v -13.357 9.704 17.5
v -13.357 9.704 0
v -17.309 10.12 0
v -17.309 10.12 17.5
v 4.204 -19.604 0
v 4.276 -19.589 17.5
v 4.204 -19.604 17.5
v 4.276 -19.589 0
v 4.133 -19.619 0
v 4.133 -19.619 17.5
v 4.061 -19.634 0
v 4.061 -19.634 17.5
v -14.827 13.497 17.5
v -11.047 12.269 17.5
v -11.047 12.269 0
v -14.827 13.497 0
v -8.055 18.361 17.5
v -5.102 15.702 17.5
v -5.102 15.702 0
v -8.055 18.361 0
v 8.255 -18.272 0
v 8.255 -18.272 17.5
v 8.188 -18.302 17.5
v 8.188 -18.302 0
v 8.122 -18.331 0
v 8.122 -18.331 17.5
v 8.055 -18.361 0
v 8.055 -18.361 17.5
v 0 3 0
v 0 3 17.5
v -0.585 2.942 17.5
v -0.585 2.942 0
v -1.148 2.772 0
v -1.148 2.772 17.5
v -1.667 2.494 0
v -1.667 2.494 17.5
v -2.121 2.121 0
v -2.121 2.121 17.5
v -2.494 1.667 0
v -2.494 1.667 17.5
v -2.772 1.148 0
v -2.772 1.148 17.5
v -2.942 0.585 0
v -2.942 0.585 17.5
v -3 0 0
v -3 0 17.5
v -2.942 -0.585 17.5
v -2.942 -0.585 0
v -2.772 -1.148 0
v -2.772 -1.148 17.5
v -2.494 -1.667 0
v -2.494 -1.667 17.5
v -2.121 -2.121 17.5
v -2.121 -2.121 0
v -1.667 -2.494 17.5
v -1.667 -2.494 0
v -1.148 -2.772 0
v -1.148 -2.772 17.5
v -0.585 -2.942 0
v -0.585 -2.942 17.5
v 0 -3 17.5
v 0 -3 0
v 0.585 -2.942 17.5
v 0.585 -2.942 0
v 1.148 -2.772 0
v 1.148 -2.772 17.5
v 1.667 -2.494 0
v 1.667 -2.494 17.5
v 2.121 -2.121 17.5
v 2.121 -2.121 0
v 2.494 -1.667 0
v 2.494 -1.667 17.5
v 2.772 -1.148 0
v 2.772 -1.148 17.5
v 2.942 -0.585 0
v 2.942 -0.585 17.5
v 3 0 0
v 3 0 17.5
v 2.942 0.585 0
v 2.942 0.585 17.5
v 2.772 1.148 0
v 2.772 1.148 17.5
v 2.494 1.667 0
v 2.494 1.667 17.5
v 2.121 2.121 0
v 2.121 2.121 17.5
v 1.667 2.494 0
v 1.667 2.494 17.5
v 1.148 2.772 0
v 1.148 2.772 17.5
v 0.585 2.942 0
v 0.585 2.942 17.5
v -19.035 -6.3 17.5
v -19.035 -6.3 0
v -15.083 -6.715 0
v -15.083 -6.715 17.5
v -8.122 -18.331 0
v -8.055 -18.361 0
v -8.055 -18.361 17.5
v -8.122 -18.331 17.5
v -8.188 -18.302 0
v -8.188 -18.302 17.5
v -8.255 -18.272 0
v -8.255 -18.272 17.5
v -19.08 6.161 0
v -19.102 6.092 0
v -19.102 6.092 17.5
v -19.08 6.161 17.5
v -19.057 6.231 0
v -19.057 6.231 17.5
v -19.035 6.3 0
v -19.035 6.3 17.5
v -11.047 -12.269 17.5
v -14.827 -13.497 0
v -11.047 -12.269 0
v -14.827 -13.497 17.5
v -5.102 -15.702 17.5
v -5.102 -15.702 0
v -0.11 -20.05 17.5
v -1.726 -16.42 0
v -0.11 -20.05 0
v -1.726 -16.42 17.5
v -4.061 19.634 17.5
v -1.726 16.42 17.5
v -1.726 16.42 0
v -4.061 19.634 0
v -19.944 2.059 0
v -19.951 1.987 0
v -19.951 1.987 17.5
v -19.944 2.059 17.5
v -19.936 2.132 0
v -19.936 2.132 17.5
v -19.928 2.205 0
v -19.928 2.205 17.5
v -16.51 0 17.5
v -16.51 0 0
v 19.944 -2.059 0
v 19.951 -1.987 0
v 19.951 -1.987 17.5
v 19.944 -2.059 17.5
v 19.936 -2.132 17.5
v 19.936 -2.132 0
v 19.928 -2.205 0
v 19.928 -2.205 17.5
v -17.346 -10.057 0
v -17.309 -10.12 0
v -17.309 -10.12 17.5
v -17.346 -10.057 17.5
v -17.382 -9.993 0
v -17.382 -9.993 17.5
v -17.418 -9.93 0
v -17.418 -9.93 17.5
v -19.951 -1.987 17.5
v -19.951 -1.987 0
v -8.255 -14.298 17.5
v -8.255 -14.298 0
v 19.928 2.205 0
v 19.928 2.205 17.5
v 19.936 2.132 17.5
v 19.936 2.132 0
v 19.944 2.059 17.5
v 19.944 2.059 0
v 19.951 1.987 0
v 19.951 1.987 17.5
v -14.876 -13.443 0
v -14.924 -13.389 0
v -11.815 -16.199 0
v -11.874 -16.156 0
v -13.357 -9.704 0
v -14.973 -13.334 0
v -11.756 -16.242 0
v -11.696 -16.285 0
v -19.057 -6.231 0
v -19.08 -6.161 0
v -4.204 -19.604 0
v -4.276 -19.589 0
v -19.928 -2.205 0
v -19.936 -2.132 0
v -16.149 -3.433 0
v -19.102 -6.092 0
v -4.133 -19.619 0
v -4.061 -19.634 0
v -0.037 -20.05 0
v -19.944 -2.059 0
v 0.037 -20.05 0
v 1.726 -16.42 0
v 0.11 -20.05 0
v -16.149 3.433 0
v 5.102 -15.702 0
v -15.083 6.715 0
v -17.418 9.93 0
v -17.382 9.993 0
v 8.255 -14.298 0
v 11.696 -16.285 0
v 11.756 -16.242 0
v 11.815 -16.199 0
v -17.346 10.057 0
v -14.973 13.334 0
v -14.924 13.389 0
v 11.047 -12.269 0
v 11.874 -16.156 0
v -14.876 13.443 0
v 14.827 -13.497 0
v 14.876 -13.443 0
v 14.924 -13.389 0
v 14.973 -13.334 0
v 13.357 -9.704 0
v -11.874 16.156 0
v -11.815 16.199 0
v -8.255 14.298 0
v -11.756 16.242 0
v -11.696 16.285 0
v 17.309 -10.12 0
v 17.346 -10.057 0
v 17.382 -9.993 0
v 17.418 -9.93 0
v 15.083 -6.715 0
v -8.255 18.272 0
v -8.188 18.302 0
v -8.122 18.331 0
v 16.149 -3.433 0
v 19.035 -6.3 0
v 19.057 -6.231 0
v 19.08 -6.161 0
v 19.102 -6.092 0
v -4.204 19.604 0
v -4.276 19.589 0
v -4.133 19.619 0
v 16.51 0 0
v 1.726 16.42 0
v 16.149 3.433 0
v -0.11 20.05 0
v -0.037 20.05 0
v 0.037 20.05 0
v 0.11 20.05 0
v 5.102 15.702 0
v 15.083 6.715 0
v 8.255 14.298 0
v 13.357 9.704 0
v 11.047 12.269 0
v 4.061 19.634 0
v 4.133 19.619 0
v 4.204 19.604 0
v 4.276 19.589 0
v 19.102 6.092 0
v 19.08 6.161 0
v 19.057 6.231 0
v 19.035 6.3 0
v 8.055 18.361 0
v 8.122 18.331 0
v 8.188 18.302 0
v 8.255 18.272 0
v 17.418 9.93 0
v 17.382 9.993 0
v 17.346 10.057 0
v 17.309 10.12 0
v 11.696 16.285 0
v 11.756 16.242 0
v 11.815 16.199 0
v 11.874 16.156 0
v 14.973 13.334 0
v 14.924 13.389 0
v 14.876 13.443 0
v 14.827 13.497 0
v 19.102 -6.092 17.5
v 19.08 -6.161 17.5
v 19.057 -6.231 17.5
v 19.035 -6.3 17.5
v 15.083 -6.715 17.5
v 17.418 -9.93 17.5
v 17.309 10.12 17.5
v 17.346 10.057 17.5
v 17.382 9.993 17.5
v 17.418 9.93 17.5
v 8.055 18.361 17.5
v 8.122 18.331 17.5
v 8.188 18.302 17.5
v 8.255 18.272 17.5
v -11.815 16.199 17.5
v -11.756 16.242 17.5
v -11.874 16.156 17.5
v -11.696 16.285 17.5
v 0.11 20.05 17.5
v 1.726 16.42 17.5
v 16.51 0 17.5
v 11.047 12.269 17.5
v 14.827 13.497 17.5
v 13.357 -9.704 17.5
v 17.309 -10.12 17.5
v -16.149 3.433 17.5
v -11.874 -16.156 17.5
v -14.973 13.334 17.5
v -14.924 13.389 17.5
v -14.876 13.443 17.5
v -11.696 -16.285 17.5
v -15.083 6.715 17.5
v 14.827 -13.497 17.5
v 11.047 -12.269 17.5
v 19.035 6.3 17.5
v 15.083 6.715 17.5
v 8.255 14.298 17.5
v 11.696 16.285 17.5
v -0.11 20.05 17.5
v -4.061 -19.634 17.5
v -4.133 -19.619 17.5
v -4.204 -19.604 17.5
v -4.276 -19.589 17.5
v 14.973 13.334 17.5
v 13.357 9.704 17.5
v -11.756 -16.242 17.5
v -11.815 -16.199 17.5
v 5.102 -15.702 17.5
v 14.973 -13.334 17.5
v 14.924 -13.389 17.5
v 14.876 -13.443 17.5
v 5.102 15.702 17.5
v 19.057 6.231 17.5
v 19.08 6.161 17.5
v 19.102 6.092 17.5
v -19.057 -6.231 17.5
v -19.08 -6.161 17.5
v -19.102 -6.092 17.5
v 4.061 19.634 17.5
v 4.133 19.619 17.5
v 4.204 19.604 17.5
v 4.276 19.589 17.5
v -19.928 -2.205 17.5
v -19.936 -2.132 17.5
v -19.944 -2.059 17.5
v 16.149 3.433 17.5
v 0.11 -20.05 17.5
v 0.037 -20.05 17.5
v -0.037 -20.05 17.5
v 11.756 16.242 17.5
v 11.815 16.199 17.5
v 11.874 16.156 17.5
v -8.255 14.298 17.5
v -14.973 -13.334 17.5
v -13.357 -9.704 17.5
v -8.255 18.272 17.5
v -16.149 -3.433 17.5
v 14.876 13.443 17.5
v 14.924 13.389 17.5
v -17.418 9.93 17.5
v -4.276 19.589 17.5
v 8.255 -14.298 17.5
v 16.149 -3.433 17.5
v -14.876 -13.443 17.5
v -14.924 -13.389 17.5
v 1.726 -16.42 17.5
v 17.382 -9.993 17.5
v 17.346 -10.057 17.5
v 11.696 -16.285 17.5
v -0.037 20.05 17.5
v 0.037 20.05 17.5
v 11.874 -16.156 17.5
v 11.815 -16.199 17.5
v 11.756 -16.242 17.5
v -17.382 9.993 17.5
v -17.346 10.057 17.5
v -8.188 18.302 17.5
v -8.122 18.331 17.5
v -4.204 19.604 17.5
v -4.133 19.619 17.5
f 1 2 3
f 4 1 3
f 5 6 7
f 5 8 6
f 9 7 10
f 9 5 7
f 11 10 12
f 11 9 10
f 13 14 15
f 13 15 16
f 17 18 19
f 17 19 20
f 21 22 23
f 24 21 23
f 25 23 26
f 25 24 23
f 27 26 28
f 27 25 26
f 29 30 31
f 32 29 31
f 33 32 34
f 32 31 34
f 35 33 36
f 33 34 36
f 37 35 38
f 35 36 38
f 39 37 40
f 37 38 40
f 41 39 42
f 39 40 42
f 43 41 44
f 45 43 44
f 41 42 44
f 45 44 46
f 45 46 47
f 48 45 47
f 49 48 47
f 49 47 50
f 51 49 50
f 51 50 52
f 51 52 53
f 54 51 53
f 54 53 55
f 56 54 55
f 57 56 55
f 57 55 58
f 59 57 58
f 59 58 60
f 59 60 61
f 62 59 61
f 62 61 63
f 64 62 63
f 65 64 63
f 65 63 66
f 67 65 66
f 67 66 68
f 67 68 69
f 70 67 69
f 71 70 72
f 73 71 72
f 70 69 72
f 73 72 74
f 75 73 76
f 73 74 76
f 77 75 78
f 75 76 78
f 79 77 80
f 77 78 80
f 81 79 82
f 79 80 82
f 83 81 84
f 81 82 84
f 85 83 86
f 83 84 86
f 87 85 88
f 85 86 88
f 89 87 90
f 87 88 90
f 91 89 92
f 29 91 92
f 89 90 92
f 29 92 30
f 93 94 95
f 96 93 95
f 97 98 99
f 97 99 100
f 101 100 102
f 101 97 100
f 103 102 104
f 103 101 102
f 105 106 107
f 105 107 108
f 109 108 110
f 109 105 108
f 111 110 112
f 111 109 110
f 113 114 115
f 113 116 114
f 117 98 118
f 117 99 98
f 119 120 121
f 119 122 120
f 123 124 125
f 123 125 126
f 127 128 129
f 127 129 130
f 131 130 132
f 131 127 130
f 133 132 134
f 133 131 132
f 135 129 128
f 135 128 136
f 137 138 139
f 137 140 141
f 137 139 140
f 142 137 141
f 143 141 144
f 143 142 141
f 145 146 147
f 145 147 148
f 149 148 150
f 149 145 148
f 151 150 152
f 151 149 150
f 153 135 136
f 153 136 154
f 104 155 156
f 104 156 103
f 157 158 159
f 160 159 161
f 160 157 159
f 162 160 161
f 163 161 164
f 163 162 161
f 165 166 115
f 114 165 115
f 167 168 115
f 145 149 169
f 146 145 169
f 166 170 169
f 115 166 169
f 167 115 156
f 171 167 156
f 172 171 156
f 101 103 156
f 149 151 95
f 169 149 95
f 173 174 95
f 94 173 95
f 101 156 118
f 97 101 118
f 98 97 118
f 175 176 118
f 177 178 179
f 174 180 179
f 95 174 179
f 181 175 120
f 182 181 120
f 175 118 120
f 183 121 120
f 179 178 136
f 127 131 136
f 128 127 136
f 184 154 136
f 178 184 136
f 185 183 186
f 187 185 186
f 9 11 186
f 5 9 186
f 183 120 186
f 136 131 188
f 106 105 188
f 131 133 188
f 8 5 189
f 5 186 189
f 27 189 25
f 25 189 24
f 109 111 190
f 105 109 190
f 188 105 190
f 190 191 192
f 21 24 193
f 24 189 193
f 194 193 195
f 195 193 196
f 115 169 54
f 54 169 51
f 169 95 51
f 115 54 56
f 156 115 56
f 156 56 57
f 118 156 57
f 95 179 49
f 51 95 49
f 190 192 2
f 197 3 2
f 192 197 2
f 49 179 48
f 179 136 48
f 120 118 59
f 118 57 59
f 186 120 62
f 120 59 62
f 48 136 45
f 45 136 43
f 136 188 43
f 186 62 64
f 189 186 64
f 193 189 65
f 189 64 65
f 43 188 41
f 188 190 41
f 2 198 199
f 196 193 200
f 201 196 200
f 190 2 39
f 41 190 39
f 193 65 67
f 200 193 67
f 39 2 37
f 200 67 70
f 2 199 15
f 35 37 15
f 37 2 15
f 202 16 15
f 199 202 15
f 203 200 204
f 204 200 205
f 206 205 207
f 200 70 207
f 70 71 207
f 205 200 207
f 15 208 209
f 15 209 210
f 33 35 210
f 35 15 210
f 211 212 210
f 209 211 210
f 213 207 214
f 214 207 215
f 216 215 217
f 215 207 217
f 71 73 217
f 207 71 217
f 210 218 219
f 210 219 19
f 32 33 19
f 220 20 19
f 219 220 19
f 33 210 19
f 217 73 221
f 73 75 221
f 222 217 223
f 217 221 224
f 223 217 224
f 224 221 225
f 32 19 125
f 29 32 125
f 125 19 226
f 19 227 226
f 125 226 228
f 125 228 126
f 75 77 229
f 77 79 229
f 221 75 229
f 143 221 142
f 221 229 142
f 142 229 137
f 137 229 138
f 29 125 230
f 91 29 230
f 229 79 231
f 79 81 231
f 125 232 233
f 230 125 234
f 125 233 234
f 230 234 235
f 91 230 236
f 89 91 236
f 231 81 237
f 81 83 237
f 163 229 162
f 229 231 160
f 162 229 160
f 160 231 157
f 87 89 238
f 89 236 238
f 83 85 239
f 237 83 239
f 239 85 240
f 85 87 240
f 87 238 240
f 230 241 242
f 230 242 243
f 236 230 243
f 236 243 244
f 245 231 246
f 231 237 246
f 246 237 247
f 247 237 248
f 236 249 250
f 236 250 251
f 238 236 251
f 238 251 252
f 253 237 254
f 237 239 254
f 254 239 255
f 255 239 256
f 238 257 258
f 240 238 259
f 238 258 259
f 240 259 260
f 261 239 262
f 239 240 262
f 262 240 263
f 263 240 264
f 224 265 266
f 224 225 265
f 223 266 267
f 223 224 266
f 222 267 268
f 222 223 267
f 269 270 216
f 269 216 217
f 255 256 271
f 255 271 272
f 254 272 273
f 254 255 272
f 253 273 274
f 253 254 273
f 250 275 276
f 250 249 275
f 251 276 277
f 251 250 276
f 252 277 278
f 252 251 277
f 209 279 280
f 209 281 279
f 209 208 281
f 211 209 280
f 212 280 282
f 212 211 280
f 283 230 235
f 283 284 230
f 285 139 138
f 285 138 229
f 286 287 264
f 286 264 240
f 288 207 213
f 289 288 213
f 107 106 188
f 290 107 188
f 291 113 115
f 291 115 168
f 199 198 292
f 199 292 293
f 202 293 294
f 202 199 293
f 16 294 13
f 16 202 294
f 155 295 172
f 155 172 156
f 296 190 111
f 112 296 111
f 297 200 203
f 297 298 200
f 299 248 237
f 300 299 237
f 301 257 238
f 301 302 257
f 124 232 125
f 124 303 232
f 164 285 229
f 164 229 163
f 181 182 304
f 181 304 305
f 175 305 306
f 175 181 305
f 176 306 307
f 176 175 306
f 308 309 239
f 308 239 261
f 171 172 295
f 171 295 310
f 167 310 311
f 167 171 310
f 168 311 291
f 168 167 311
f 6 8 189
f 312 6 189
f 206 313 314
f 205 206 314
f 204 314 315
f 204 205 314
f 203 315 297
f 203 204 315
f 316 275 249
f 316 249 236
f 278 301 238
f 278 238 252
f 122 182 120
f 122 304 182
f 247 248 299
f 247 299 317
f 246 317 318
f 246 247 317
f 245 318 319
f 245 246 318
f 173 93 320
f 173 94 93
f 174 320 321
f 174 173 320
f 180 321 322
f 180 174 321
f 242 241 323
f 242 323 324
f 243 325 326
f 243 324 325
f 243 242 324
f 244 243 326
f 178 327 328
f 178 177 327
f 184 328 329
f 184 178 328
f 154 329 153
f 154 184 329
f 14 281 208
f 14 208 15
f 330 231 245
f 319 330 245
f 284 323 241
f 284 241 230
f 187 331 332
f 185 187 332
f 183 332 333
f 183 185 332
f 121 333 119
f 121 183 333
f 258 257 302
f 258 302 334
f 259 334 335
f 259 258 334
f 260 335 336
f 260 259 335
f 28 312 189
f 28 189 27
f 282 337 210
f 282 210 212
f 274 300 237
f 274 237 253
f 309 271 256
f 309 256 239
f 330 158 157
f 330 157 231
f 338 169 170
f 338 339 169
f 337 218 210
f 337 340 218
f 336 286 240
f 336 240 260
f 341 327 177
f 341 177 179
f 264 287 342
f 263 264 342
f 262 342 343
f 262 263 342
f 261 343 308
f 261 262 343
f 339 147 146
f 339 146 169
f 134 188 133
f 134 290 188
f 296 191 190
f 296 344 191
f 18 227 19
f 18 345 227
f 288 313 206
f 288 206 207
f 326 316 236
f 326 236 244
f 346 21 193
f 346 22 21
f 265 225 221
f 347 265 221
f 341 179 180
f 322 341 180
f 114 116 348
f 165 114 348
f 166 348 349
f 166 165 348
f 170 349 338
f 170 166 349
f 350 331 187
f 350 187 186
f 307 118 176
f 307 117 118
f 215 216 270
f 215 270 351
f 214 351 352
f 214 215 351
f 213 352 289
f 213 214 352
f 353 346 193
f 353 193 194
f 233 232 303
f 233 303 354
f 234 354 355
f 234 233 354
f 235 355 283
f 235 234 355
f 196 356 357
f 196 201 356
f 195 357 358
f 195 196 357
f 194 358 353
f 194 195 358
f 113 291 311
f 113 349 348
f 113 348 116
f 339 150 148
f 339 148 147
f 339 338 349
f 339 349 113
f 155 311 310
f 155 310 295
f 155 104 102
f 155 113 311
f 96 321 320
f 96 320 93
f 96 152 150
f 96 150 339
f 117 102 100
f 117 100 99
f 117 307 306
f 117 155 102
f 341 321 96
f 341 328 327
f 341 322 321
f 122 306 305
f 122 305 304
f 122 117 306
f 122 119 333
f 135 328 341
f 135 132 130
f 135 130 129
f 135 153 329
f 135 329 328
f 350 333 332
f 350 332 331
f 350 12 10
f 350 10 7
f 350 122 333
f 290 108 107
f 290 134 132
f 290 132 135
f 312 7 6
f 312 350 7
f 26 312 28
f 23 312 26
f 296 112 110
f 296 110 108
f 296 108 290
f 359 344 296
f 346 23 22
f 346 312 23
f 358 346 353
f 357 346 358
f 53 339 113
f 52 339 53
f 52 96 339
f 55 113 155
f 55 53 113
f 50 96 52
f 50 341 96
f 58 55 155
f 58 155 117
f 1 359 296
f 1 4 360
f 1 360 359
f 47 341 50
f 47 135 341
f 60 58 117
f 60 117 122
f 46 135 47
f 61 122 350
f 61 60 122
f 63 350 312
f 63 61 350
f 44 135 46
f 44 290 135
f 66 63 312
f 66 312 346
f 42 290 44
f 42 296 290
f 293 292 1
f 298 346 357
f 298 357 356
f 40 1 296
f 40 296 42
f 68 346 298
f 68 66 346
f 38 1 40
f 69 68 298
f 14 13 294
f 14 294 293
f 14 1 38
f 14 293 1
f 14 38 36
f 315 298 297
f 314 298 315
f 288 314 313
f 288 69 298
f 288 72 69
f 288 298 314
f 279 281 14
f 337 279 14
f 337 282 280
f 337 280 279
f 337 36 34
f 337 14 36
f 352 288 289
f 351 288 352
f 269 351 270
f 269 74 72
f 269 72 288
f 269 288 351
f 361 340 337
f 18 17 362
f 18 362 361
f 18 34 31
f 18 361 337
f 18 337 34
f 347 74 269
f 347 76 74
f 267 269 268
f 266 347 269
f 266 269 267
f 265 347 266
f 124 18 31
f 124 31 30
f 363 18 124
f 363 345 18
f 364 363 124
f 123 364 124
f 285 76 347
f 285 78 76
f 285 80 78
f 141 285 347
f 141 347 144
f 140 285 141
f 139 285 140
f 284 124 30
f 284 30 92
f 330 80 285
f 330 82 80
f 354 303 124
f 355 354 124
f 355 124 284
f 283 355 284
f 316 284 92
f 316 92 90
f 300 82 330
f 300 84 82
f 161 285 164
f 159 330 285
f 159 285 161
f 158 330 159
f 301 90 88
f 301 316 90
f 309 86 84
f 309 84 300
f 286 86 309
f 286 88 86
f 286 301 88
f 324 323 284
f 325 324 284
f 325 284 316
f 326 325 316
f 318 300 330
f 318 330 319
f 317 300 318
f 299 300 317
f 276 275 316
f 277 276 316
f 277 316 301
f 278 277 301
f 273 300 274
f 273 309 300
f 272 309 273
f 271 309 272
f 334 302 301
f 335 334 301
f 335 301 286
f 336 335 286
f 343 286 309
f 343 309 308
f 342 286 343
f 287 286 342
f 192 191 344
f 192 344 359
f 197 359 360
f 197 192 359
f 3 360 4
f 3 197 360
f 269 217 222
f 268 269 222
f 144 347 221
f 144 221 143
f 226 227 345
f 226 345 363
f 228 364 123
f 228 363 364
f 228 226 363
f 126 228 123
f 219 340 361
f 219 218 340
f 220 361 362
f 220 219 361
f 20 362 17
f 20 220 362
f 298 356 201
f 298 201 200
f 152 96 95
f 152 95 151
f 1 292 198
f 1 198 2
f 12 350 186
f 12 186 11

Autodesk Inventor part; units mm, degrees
ref_plane "YZ Plane" through (0, 0, 0) normal (1, 0, 0) x (0, 1, 0)
ref_plane "XZ Plane" through (0, 0, 0) normal (0, 1, 0) x (-1, 0, 0)
ref_plane "XY Plane" through (0, 0, 0) normal (0, 0, 1) x (1, 0, 0)
sketch "Sketch1" plane through (0, 0, 0) normal (0, 0, 1) x (1, 0, 0)
  circle A0 centre (0, 0) radius 20.05
  dimension "d0" = 40.1
extrude "Extrusion1" add sketch "Sketch1" along normal blind 17.5
sketch "Sketch2" plane through (0, 0, 17.5) normal (0, 0, 1) x (1, 0, 0)
  line L0 (-16.51, 0) -> (-20.1782, -2.1178)
  line L1 (-20.1782, -2.1178) -> (-20.1782, 2.1178)
  line L2 (-20.1782, 2.1178) -> (-16.51, 0)
  line L3 (-16.1492, -3.4326) -> (-19.297, -6.2669)
  line L4 (-19.297, -6.2669) -> (-20.1776, -2.1237)
  line L5 (-20.1776, -2.1237) -> (-16.1492, -3.4326)
  line L6 (-15.0827, -6.7152) -> (-17.5723, -10.142)
  line L7 (-17.5723, -10.142) -> (-19.2951, -6.2725)
  line L8 (-19.2951, -6.2725) -> (-15.0827, -6.7152)
  line L9 (-13.3569, -9.7043) -> (-15.0797, -13.5738)
  line L10 (-15.0797, -13.5738) -> (-17.5694, -10.1471)
  line L11 (-17.5694, -10.1471) -> (-13.3569, -9.7043)
  line L12 (-11.0474, -12.2693) -> (-11.928, -16.4125)
  line L13 (-11.928, -16.4125) -> (-15.0757, -13.5782)
  line L14 (-15.0757, -13.5782) -> (-11.0474, -12.2693)
  line L15 (-8.255, -14.2981) -> (-8.255, -18.5338)
  line L16 (-8.255, -18.5338) -> (-11.9232, -16.4159)
  line L17 (-11.9232, -16.4159) -> (-8.255, -14.2981)
  line L18 (-5.1019, -15.702) -> (-4.2212, -19.8451)
  line L19 (-4.2212, -19.8451) -> (-8.2496, -18.5362)
  line L20 (-8.2496, -18.5362) -> (-5.1019, -15.702)
  line L21 (-1.7258, -16.4196) -> (-0.003, -20.2891)
  line L22 (-0.003, -20.2891) -> (-4.2154, -19.8463)
  line L23 (-4.2154, -19.8463) -> (-1.7258, -16.4196)
  line L24 (1.7258, -16.4196) -> (4.2154, -19.8463)
  line L25 (4.2154, -19.8463) -> (0.003, -20.2891)
  line L26 (0.003, -20.2891) -> (1.7258, -16.4196)
  line L27 (5.1019, -15.702) -> (8.2496, -18.5362)
  line L28 (8.2496, -18.5362) -> (4.2212, -19.8451)
  line L29 (4.2212, -19.8451) -> (5.1019, -15.702)
  line L30 (8.255, -14.2981) -> (11.9232, -16.4159)
  line L31 (11.9232, -16.4159) -> (8.255, -18.5338)
  line L32 (8.255, -18.5338) -> (8.255, -14.2981)
  line L33 (11.0474, -12.2693) -> (15.0757, -13.5782)
  line L34 (15.0757, -13.5782) -> (11.928, -16.4125)
  line L35 (11.928, -16.4125) -> (11.0474, -12.2693)
  line L36 (13.3569, -9.7043) -> (17.5694, -10.1471)
  line L37 (17.5694, -10.1471) -> (15.0797, -13.5738)
  line L38 (15.0797, -13.5738) -> (13.3569, -9.7043)
  line L39 (15.0827, -6.7152) -> (19.2951, -6.2725)
  line L40 (19.2951, -6.2725) -> (17.5723, -10.142)
  line L41 (17.5723, -10.142) -> (15.0827, -6.7152)
  line L42 (16.1492, -3.4326) -> (20.1776, -2.1237)
  line L43 (20.1776, -2.1237) -> (19.297, -6.2669)
  line L44 (19.297, -6.2669) -> (16.1492, -3.4326)
  line L45 (16.51, 0) -> (20.1782, 2.1178)
  line L46 (20.1782, 2.1178) -> (20.1782, -2.1178)
  line L47 (20.1782, -2.1178) -> (16.51, 0)
  line L48 (16.1492, 3.4326) -> (19.297, 6.2669)
  line L49 (19.297, 6.2669) -> (20.1776, 2.1237)
  line L50 (20.1776, 2.1237) -> (16.1492, 3.4326)
  line L51 (15.0827, 6.7152) -> (17.5723, 10.142)
  line L52 (17.5723, 10.142) -> (19.2951, 6.2725)
  line L53 (19.2951, 6.2725) -> (15.0827, 6.7152)
  line L54 (13.3569, 9.7043) -> (15.0797, 13.5738)
  line L55 (15.0797, 13.5738) -> (17.5694, 10.1471)
  line L56 (17.5694, 10.1471) -> (13.3569, 9.7043)
  line L57 (11.0474, 12.2693) -> (11.928, 16.4125)
  line L58 (11.928, 16.4125) -> (15.0757, 13.5782)
  line L59 (15.0757, 13.5782) -> (11.0474, 12.2693)
  line L60 (8.255, 14.2981) -> (8.255, 18.5338)
  line L61 (8.255, 18.5338) -> (11.9232, 16.4159)
  line L62 (11.9232, 16.4159) -> (8.255, 14.2981)
  line L63 (5.1019, 15.702) -> (4.2212, 19.8451)
  line L64 (4.2212, 19.8451) -> (8.2496, 18.5362)
  line L65 (8.2496, 18.5362) -> (5.1019, 15.702)
  line L66 (1.7258, 16.4196) -> (0.003, 20.2891)
  line L67 (0.003, 20.2891) -> (4.2154, 19.8463)
  line L68 (4.2154, 19.8463) -> (1.7258, 16.4196)
  line L69 (-1.7258, 16.4196) -> (-4.2154, 19.8463)
  line L70 (-4.2154, 19.8463) -> (-0.003, 20.2891)
  line L71 (-0.003, 20.2891) -> (-1.7258, 16.4196)
  line L72 (-5.1019, 15.702) -> (-8.2496, 18.5362)
  line L73 (-8.2496, 18.5362) -> (-4.2212, 19.8451)
  line L74 (-4.2212, 19.8451) -> (-5.1019, 15.702)
  line L75 (-8.255, 14.2981) -> (-11.9232, 16.4159)
  line L76 (-11.9232, 16.4159) -> (-8.255, 18.5338)
  line L77 (-8.255, 18.5338) -> (-8.255, 14.2981)
  line L78 (-11.0474, 12.2693) -> (-15.0757, 13.5782)
  line L79 (-15.0757, 13.5782) -> (-11.928, 16.4125)
  line L80 (-11.928, 16.4125) -> (-11.0474, 12.2693)
  line L81 (-13.3569, 9.7043) -> (-17.5694, 10.1471)
  line L82 (-17.5694, 10.1471) -> (-15.0797, 13.5738)
  line L83 (-15.0797, 13.5738) -> (-13.3569, 9.7043)
  line L84 (-15.0827, 6.7152) -> (-19.2951, 6.2725)
  line L85 (-19.2951, 6.2725) -> (-17.5723, 10.142)
  line L86 (-17.5723, 10.142) -> (-15.0827, 6.7152)
  line L87 (-16.1492, 3.4326) -> (-20.1776, 2.1237)
  line L88 (-20.1776, 2.1237) -> (-19.297, 6.2669)
  line L89 (-19.297, 6.2669) -> (-16.1492, 3.4326)
  point P0 (0, 0)
  point P1 (-18.9555, 0)
  point P2 (-18.5413, -3.9411)
  point P3 (-17.3167, -7.7099)
  point P4 (-15.3353, -11.1418)
  point P5 (-12.6837, -14.0867)
  point P6 (-9.4777, -16.4159)
  point P7 (-5.8576, -18.0277)
  point P8 (-1.9814, -18.8517)
  point P9 (1.9814, -18.8517)
  point P10 (5.8576, -18.0277)
  point P11 (9.4777, -16.4159)
  point P12 (12.6837, -14.0867)
  point P13 (15.3353, -11.1418)
  point P14 (17.3167, -7.7099)
  point P15 (18.5413, -3.9411)
  point P16 (18.9555, 0)
  point P17 (18.5413, 3.9411)
  point P18 (17.3167, 7.7099)
  point P19 (15.3353, 11.1418)
  point P20 (12.6837, 14.0867)
  point P21 (9.4777, 16.4159)
  point P22 (5.8576, 18.0277)
  point P23 (1.9814, 18.8517)
  point P24 (-1.9814, 18.8517)
  point P25 (-5.8576, 18.0277)
  point P26 (-9.4777, 16.4159)
  point P27 (-12.6837, 14.0867)
  point P28 (-15.3353, 11.1418)
  point P29 (-17.3167, 7.7099)
  point P30 (-18.5413, 3.9411)
  dimension "d5" = 360
extrude "Extrusion2" cut sketch "Sketch2" against normal through all
sketch "Sketch3" plane through (0, 0, 0) normal (0, 0, -1) x (-1, 0, 0)
  point P0 (0, 0)
  point P1 (0, 0)
hole "Hole1" at (0, 0, 0) at (0, 0, 0) direction (0, 0, 1) diameter 6 end through all
properties part number "gear(1.5 inch with 2mm extra)"
